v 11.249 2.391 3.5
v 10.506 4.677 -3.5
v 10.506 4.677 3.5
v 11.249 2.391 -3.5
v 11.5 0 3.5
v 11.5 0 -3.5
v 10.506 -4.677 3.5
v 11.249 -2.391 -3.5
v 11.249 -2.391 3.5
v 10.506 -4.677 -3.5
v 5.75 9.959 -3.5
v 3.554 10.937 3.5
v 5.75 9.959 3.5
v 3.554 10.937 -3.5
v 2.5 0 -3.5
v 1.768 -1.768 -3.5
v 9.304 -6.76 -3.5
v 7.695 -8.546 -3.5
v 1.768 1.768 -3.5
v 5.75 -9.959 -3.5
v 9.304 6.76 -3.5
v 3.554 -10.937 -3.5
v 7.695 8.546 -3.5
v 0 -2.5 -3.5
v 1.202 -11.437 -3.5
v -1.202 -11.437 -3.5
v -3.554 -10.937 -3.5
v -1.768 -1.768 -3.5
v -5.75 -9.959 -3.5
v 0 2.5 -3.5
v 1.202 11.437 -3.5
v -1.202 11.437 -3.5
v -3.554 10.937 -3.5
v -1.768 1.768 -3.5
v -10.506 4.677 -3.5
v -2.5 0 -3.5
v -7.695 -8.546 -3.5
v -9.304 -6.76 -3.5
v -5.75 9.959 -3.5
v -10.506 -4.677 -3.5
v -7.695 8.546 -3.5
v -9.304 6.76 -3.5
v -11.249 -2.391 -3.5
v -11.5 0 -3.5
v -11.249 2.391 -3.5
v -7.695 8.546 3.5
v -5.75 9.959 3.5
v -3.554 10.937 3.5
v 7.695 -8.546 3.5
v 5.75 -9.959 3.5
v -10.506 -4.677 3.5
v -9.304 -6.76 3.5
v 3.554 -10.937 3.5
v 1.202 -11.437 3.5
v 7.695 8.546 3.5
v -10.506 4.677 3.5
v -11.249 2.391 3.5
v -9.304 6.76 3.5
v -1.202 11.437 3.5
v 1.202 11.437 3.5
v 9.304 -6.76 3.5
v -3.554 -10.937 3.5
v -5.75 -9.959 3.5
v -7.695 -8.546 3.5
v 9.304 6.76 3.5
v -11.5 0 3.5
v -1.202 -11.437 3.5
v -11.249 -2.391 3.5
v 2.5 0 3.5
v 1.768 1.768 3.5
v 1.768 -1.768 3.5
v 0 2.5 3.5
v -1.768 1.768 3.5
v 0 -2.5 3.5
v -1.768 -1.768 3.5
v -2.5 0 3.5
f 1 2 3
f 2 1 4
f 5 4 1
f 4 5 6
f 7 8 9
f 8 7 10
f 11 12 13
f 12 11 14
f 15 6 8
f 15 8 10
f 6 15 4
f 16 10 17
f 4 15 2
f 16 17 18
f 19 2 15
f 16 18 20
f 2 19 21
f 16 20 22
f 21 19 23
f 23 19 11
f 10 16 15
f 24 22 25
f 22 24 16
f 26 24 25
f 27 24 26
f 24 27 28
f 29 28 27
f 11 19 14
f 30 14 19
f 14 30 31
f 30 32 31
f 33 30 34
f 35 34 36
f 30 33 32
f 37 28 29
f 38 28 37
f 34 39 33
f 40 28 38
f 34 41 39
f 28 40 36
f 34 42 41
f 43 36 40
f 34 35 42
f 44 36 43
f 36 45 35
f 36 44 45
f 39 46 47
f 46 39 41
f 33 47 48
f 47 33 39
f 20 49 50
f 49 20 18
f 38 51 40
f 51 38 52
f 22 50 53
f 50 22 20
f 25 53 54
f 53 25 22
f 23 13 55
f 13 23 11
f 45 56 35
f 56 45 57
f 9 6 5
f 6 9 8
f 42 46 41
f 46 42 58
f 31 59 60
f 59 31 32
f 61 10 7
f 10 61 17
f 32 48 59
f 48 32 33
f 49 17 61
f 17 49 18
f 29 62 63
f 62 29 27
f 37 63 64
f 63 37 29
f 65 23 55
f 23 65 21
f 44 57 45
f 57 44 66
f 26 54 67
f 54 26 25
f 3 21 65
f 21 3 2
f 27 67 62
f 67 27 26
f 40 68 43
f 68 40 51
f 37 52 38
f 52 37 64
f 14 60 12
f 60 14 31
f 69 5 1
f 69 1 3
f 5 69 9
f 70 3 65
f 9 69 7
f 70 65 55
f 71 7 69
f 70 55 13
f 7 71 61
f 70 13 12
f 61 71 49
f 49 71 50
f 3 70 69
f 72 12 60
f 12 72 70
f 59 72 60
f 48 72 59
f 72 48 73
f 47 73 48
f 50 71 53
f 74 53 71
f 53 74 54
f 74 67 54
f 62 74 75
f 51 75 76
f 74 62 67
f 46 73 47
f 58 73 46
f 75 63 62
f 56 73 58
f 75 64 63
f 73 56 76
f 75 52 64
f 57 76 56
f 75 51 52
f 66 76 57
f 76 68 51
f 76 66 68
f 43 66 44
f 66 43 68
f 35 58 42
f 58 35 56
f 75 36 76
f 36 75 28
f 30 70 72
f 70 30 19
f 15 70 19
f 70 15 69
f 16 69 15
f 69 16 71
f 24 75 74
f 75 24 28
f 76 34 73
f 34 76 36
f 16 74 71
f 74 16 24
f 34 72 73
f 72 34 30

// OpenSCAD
// file: ../utility/ring.scad
// some defaults for testing
ID = 5;
OD = 10;
width = 5;



module ring(ID, OD, width) {
    difference() {
	    cylinder(r=OD/2, h=width, center=true);
	    cylinder(r=ID/2, h=width+2, center=true);
	}
}

ring(ID, OD, width);
// main file
use <../utility/ring.scad>

function create_bearing_dims(bearing_ID, bearing_OD, bearing_width) = [bearing_ID, bearing_OD, bearing_width];

module bearing(bearing_dims) {

	bearing_ID = bearing_dims[0];
	bearing_OD = bearing_dims[1];
	bearing_width = bearing_dims[2];

	color("white")
	ring(bearing_ID, bearing_OD, bearing_width);
}

bearing_dims = create_bearing_dims(5, 23, 7);
bearing(bearing_dims);
